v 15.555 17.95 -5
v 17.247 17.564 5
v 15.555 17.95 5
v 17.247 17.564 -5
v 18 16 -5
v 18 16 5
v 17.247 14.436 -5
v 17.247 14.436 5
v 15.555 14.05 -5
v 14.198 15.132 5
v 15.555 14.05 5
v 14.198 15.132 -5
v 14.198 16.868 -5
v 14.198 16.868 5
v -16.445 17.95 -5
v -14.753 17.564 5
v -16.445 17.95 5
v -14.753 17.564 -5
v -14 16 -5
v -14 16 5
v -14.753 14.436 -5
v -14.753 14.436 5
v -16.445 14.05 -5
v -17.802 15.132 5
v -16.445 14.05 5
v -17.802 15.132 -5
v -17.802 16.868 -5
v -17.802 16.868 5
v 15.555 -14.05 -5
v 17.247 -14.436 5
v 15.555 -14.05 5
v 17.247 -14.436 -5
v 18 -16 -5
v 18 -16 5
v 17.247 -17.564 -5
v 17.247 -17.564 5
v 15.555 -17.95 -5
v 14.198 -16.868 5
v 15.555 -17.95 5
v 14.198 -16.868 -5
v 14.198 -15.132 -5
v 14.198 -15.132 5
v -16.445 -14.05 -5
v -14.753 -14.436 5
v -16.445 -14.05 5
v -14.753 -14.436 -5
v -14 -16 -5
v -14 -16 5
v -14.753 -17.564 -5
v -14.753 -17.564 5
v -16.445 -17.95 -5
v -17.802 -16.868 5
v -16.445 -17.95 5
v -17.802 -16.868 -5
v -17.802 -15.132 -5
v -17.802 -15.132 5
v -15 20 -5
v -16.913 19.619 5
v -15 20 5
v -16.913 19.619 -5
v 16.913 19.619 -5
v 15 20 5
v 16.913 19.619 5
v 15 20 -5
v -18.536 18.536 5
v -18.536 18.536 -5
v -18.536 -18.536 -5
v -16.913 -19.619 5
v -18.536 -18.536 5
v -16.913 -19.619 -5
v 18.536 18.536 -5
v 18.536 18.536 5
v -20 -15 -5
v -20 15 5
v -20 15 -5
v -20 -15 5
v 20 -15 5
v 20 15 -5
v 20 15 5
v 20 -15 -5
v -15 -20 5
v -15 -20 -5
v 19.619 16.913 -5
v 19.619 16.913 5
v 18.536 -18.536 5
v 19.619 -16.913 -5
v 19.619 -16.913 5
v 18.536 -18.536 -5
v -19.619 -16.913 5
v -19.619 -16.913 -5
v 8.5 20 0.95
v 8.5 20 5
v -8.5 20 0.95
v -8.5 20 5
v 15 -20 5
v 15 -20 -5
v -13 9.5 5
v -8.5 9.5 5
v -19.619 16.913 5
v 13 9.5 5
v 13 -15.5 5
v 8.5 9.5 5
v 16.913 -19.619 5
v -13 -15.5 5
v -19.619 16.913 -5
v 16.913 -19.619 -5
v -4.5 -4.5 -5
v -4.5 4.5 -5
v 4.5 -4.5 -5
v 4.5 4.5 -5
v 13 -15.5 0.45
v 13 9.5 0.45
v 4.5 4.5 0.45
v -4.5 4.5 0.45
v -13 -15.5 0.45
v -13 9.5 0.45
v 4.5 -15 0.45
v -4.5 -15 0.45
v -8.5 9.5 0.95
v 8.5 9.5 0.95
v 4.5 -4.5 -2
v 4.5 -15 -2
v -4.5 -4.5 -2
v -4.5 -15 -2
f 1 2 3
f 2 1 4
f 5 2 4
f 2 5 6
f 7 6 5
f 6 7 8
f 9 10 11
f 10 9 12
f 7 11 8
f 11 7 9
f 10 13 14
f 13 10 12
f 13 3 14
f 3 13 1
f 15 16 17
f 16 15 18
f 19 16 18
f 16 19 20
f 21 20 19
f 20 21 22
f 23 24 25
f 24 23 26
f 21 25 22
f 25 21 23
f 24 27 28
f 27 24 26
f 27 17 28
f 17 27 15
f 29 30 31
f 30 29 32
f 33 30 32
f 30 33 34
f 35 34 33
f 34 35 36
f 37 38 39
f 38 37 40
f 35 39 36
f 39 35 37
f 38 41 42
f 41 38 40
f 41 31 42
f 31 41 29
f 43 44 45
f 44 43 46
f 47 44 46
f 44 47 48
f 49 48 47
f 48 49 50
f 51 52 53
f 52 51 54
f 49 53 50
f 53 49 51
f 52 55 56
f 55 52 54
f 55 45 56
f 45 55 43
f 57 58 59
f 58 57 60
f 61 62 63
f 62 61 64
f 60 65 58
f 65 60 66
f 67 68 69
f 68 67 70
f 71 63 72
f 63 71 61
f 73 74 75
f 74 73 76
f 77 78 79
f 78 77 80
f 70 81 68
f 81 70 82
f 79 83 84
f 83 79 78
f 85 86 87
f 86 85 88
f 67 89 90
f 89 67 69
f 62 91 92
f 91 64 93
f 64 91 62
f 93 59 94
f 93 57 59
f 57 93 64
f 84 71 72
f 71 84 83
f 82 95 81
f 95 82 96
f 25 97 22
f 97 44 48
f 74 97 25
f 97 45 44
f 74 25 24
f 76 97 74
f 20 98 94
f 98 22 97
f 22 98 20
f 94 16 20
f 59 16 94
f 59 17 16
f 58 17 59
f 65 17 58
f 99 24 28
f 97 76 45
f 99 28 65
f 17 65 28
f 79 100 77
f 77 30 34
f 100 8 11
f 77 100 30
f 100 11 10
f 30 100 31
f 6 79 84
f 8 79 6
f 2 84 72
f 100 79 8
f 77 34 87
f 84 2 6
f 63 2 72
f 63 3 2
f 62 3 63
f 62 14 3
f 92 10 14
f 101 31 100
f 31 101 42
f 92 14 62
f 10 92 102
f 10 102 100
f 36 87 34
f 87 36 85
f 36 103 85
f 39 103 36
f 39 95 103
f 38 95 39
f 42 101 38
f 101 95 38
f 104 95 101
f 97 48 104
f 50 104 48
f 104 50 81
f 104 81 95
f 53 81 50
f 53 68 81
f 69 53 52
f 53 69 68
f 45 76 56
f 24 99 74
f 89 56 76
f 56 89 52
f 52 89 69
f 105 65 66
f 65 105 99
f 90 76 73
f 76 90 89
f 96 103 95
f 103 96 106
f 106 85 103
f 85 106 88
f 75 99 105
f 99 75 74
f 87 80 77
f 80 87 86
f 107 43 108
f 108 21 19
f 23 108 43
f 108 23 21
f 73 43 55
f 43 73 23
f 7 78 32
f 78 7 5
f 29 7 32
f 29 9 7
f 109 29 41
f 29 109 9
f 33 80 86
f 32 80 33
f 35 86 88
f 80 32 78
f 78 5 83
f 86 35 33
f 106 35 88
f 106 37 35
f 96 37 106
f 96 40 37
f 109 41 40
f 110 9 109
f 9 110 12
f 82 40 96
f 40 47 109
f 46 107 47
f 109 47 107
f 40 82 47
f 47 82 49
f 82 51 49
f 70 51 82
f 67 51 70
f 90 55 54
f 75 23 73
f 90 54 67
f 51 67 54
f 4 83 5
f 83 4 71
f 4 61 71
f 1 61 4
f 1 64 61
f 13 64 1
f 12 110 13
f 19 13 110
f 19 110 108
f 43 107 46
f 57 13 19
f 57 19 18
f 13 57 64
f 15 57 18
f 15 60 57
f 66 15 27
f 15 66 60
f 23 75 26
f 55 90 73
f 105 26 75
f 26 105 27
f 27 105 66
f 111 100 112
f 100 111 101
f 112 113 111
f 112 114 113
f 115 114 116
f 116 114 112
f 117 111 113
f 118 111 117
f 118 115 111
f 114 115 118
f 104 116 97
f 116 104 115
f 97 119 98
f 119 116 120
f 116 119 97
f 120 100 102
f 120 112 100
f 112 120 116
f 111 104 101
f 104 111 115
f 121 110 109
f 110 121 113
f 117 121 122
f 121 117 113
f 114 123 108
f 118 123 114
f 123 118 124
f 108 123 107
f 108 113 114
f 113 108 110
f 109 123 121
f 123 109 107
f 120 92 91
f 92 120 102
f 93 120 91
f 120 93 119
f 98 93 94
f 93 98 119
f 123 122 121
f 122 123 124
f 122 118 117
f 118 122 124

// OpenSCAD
// file: ../primitives/rounded_rect.scad
module RoundedRect(x, y, z, r, centre=false)
{
  module OriginRect(x, y, z, r)
  {
    upper_x = x - r;
    upper_y = y - r;
    hull()
    {
      translate([r, r, 0])
        cylinder(r=r, h=z);
      translate([upper_x, r, 0])
        cylinder(r=r, h=z);
      translate([r, upper_y, 0])
        cylinder(r=r, h=z);
      translate([upper_x, upper_y, 0])
        cylinder(r=r, h=z);
    }
  }

  module CentreRect(x, y, z, r)
  {
    cx = (x / 2) - r;
    cy = (y / 2) - r;
    cz = -(z / 2);
    hull()
    {
      translate([-cx, -cy, cz])
        cylinder(r=r, h=z);
      translate([-cx, cy, cz])
        cylinder(r=r, h=z);
      translate([cx, -cy, cz])
        cylinder(r=r, h=z);
      translate([cx, cy, cz])
        cylinder(r=r, h=z);
    }
  }
  
  if(centre)
    CentreRect(x, y, z, r);
  else
    OriginRect(x, y, z, r);
}
// main file
include <../primitives/rounded_rect.scad>

module cableOpening() {
	translate([0,14,3])
		cube(size=[17,12.1,4.1],center=true);
}

module chipOpening() {
	clearance = 0.5;
	c = 2 * clearance;
	translate([0,-9.5,0])
		cube(size=[8+c,10+c,4],center=true);
}

module lensOpening() {
	clearance = 0.5;
	c = 2 * clearance;
	translate([0,0,-2.5])
		cube(size=[8+c,8+c,6], center=true);
}

module boardOpening() {
	clearance = 0.5;
	c = 2 * clearance;
	translate([0,-3,3])
		cube(size=[25+c,24+c,5.1], center=true);
}

module mountingHoles()
{
	dx = 16;
	dy = 16;
	radius = 2;
	translate([dx, dy, 0])
		cylinder(r=radius, h=20);
	translate([-dx, dy, 0])
		cylinder(r=radius, h=20);
	translate([dx, -dy, 0])
		cylinder(r=radius, h=20);
	translate([-dx, -dy, 0])
		cylinder(r=radius, h=20);
}

module piCameraAdapter() {
	difference() {
		difference() {
			RoundedRect(40, 40, 10, 5, centre=true);
			boardOpening();
			lensOpening();
			cableOpening();
			chipOpening();
			translate([0, 0, -10.1])
				mountingHoles();
		}
	}
}

piCameraAdapter();
